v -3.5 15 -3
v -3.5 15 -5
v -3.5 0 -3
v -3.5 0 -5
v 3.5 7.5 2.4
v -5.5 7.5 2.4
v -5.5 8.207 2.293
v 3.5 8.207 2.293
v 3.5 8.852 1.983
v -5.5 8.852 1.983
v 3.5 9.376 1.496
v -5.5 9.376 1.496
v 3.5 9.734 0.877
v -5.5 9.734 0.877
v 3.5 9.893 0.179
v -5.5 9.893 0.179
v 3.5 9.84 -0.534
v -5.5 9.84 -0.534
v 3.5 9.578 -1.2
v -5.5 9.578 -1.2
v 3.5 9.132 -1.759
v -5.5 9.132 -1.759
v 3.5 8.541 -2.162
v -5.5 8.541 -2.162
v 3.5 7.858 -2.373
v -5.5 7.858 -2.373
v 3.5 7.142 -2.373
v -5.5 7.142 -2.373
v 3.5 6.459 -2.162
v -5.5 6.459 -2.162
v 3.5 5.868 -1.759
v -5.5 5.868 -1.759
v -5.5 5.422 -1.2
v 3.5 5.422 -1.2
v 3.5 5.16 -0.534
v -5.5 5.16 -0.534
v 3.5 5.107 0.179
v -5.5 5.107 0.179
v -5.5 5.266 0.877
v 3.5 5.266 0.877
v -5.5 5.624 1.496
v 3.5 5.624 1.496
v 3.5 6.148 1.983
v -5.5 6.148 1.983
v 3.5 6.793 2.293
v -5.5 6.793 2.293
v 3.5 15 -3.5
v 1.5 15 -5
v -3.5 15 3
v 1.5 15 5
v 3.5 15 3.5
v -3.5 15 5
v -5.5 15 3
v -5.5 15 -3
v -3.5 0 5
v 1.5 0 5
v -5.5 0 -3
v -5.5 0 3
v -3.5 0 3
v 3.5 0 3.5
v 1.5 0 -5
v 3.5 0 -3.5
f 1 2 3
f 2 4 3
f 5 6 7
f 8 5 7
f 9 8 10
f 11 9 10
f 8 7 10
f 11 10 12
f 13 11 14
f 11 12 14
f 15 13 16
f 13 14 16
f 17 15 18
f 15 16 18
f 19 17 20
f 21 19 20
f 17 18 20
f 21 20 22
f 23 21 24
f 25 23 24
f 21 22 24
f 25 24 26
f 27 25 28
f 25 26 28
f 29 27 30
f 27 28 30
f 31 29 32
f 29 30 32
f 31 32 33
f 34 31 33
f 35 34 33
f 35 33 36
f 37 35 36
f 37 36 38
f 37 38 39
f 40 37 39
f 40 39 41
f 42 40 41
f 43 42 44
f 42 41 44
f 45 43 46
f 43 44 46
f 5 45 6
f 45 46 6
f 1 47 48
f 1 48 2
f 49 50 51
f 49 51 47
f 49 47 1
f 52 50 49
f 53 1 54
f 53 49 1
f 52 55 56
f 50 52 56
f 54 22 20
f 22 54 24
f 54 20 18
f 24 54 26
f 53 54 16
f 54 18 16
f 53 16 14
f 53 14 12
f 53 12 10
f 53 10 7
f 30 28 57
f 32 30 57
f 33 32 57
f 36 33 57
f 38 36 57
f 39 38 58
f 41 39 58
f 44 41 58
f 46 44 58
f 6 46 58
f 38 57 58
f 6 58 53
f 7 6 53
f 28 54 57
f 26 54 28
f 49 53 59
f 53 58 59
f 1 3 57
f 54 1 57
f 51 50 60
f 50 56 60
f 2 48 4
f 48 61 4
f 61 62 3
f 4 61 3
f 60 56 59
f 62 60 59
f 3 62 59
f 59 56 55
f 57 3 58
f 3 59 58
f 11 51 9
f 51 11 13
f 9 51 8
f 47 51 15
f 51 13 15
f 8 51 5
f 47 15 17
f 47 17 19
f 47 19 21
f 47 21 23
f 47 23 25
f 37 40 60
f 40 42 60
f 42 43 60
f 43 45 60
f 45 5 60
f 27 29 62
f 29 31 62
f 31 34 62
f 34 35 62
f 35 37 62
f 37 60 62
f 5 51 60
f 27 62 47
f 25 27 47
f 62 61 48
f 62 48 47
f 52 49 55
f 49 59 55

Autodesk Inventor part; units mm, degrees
ref_plane "YZ Plane" through (0, 0, 0) normal (1, 0, 0) x (0, 1, 0)
ref_plane "XZ Plane" through (0, 0, 0) normal (0, 1, 0) x (-1, 0, 0)
ref_plane "XY Plane" through (0, 0, 0) normal (0, 0, 1) x (1, 0, 0)
sketch "Sketch1" plane through (0, 0, 0) normal (0, 1, 0) x (-1, 0, 0)
  line L0 (3.5, 5) -> (-3.5, 5)
  line L1 (-3.5, 5) -> (-3.5, -5)
  line L2 (-3.5, -5) -> (3.5, -5)
  line L3 (3.5, -5) -> (3.5, 5)
  line L4 (3.5, 5) -> (-3.5, -5) construction
  line L5 (-3.5, 5) -> (3.5, -5) construction
  line L6 (-1.5, 5) -> (-3.5, 3.5)
  line L7 (-1.5, -5) -> (-3.5, -3.5)
  line L8 (5.5, 3) -> (1.5, 3)
  line L9 (1.5, 3) -> (1.5, -3)
  line L10 (1.5, -3) -> (5.5, -3)
  line L11 (5.5, -3) -> (5.5, 3)
  line L12 (5.5, 3) -> (1.5, -3) construction
  line L13 (1.5, 3) -> (5.5, -3) construction
  point P0 (0, 0)
  point P1 (-3.5, 0)
  point P2 (3.5, 0)
  point P3 (3.5, 3)
  point P4 (3.5, -3)
  dimension "d0" = 7
  dimension "d1" = 10
  dimension "d2" = 5
  dimension "d3" = 5
  dimension "d4" = 3.5
  dimension "d5" = 3.5
  dimension "d6" = 4
  dimension "d7" = 6
extrude "Extrusion1" add sketch "Sketch1" along normal blind 15 contours L3 L8 L9 L10 L2 L7 L1 L6 L0 | L8 L11 L10 L3 | L3 L10 L9 L8
sketch "Sketch2" plane through (-5.5, 0, -3) normal (-1, 0, 0) x (0, 0, 1)
  circle A0 centre (3, 7.5) radius 2.4
  line L0 (0, 0) -> (6, 0) projected
  line L1 (0, 0) -> (0, 15) projected
  point P0 (3, 0)
  dimension "d10" = 4.8
  dimension "d11" = 7.5
  dimension "d12" = 3
extrude "Extrusion2" cut sketch "Sketch2" against normal through all
thread "Thread1" size "M5x0.8" class "6H" standard "ISO Metric profile" full length
properties part number "drazka"
